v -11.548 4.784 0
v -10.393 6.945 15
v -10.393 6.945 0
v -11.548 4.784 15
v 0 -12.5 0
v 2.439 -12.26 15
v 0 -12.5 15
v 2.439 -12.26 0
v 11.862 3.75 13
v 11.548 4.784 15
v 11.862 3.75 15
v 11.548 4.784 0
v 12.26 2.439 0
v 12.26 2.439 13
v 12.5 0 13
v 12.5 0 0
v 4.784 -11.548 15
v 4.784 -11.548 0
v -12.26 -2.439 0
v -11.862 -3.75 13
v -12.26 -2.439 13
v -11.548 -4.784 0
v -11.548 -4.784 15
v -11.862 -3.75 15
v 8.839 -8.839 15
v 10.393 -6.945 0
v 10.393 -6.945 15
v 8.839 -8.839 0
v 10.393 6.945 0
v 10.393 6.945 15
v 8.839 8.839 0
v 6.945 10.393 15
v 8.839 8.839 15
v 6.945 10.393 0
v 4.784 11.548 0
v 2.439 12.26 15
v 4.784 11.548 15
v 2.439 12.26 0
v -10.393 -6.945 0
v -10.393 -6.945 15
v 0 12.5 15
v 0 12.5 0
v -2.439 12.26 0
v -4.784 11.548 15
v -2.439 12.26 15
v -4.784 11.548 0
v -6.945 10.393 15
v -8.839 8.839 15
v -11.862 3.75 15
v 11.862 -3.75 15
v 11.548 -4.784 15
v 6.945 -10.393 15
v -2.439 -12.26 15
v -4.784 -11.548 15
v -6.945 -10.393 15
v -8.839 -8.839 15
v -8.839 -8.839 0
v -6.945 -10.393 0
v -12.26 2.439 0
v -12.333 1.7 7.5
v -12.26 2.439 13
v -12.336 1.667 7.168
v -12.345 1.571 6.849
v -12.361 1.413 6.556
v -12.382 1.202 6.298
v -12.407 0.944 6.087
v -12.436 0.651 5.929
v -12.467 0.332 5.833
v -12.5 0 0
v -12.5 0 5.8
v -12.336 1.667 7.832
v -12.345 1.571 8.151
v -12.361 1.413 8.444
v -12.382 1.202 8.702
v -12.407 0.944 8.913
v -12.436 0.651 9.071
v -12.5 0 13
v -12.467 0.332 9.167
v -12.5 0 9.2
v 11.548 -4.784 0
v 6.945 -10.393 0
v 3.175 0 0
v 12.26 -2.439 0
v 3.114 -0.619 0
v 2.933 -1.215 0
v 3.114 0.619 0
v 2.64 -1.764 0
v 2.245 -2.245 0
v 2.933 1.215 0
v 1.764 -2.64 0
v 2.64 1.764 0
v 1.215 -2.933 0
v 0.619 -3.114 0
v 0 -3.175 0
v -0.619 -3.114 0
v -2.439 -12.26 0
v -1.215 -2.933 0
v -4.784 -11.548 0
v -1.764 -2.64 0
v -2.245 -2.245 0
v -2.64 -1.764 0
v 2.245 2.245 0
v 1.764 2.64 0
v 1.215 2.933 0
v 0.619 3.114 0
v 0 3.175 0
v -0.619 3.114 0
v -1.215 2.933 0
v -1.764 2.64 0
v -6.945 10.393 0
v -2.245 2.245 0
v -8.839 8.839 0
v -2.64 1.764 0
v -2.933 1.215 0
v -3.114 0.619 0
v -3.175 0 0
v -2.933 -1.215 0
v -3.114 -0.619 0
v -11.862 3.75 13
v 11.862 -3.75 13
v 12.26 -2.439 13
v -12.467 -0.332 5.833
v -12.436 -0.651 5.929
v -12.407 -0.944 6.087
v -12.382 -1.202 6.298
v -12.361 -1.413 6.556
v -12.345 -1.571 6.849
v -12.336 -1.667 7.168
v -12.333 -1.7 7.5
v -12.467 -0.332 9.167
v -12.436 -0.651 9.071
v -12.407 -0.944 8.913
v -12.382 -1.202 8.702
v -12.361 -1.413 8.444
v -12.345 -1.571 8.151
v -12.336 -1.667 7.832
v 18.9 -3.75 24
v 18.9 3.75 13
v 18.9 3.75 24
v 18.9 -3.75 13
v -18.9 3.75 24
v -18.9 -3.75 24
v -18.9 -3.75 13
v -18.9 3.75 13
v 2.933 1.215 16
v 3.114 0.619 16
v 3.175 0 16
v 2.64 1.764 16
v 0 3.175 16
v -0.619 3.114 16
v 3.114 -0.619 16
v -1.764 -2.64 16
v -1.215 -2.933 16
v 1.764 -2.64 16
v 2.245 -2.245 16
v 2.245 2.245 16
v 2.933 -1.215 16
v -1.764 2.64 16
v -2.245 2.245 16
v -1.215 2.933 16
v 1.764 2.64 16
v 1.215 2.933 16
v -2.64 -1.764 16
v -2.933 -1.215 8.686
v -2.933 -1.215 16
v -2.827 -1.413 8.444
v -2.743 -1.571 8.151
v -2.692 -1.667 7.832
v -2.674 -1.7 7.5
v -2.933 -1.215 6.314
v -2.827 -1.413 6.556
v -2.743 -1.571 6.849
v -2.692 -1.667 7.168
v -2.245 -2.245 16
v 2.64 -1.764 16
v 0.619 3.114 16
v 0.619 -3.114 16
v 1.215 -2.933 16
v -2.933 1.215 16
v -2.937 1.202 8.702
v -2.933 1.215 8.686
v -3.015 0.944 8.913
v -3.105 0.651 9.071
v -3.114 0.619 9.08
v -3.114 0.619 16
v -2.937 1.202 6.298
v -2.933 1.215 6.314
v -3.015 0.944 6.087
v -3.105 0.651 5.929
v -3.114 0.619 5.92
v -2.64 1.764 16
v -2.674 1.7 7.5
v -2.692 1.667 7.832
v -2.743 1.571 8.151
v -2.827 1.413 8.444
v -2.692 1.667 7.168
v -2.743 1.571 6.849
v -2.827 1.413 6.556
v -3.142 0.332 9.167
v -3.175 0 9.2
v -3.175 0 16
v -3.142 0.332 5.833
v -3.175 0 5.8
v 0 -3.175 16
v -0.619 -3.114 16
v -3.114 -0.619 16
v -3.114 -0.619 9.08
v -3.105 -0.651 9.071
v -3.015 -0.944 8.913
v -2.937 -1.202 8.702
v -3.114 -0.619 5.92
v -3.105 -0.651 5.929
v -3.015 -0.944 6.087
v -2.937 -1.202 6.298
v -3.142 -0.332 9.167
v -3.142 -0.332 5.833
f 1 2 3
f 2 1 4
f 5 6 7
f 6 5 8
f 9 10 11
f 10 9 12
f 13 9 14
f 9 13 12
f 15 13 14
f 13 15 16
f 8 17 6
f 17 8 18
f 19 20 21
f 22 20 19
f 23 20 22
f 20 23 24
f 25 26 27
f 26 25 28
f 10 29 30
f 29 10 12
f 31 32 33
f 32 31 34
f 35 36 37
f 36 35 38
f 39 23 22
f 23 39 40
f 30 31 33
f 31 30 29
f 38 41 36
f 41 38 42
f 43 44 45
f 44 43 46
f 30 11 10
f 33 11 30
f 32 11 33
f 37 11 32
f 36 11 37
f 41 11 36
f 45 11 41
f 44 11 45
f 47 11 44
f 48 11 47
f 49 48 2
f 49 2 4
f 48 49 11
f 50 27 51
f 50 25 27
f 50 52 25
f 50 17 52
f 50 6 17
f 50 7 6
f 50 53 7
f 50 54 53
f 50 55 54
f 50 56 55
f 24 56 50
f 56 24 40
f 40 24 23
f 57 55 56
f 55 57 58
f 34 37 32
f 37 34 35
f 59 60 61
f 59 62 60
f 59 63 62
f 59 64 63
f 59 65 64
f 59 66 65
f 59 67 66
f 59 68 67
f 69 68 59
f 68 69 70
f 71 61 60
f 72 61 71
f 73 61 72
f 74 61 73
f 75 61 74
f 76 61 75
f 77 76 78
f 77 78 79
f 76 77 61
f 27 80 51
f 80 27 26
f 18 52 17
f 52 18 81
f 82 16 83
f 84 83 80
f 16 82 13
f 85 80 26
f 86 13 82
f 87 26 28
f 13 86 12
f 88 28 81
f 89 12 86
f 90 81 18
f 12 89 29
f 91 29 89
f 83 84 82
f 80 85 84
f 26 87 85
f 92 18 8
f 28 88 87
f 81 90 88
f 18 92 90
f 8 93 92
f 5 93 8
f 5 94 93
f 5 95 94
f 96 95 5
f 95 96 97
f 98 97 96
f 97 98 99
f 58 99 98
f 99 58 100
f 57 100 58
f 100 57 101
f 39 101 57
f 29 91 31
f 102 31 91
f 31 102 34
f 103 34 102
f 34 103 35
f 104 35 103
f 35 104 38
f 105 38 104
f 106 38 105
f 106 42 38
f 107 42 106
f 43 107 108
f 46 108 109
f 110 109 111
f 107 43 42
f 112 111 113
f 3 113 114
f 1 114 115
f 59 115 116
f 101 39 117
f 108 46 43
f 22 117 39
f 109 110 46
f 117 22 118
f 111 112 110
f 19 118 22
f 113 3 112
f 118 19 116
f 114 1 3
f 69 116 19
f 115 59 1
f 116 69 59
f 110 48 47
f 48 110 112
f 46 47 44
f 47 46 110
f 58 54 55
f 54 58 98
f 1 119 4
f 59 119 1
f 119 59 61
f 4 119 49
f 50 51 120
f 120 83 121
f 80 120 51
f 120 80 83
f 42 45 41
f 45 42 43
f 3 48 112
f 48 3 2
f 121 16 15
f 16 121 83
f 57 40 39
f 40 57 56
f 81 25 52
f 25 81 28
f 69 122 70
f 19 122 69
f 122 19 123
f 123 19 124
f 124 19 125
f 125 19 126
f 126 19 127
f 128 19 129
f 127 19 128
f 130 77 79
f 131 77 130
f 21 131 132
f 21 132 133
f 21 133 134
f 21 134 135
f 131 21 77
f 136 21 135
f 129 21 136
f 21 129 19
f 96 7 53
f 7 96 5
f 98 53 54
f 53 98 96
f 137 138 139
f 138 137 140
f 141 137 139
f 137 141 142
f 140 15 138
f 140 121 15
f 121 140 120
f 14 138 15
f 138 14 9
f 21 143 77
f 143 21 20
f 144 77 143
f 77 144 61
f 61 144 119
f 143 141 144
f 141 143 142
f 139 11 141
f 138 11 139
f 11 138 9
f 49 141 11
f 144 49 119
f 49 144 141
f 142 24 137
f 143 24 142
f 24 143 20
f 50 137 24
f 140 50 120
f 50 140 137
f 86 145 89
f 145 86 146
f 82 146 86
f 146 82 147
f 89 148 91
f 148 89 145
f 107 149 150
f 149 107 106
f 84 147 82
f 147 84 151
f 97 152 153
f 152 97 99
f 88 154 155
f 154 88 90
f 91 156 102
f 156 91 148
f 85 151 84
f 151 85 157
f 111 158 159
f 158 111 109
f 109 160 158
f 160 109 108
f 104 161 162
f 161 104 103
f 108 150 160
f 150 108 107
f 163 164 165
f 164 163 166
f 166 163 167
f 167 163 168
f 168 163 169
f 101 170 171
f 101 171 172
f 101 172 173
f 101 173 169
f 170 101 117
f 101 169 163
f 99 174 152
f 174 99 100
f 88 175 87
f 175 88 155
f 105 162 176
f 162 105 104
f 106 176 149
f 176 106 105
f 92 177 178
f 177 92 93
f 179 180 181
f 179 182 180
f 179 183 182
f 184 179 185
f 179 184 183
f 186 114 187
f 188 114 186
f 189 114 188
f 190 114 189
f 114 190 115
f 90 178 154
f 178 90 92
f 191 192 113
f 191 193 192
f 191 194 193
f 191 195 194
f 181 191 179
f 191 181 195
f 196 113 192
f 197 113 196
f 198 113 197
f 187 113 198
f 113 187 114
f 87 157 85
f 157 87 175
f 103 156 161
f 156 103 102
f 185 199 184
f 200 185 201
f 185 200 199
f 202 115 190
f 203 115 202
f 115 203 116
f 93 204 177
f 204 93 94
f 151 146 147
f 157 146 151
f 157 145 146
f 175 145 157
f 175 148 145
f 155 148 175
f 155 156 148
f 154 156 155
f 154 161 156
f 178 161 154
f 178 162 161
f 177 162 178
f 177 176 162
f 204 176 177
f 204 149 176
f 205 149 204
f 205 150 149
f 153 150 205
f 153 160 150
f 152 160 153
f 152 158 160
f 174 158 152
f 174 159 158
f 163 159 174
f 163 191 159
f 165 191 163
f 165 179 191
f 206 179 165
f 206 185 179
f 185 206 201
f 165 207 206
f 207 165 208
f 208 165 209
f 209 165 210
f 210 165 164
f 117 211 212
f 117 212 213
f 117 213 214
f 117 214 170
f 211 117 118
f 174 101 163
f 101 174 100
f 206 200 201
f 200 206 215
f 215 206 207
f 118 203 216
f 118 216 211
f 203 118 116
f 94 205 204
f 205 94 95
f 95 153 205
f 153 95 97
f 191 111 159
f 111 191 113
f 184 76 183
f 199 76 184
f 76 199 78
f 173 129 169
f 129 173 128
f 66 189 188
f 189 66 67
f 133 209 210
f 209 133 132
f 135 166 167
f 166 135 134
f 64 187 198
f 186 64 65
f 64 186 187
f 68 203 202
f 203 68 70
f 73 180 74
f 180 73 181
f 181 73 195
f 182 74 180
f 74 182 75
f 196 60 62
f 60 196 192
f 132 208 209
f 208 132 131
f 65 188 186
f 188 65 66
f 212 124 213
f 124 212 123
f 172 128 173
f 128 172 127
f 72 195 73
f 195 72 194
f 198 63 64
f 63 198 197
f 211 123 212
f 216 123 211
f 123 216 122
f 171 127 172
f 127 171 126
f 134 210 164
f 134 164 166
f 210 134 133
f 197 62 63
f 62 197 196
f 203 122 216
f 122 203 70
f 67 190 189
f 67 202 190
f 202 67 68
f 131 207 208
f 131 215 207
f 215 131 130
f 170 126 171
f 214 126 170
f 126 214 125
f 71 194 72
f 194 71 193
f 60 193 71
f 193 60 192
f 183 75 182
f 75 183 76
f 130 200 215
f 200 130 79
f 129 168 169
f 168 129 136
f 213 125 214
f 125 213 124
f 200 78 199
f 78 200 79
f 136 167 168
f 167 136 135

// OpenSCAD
$fn = 32;

// ----------------------------------------------------------------------
// Hand knob: 25 x 37.8 x 15 mm
// ----------------------------------------------------------------------

// --- parameters (mm) ---
grip_d = 25;              // knob diameter
grip_h = 15;              // knob height
shaft_d = 6.35;           // shaft bore
set_d = 3.4;              // set screw tap hole
wing_l = 37.8;            // wing span
wing_w = 7.5;             // wing width
wing_h = 9;               // wing thickness

module body() {
  cylinder(h = grip_h, d = grip_d);
}

module wing() {
  /* wing sunk 2 mm into the knob so the joint overlaps */
  translate([-wing_l / 2, -wing_w / 2, grip_h - 2])
    cube([wing_l, wing_w, wing_h + 2]);
}

difference() {
  union() {
    body();
    wing();
  }
  translate([0, 0, -1]) cylinder(h = grip_h + 0 + 2, d = shaft_d);
  translate([-grip_d / 2 - 1, 0, grip_h * 0.5]) rotate([0, 90, 0]) cylinder(h = grip_d / 2 + 2, d = set_d);
}
